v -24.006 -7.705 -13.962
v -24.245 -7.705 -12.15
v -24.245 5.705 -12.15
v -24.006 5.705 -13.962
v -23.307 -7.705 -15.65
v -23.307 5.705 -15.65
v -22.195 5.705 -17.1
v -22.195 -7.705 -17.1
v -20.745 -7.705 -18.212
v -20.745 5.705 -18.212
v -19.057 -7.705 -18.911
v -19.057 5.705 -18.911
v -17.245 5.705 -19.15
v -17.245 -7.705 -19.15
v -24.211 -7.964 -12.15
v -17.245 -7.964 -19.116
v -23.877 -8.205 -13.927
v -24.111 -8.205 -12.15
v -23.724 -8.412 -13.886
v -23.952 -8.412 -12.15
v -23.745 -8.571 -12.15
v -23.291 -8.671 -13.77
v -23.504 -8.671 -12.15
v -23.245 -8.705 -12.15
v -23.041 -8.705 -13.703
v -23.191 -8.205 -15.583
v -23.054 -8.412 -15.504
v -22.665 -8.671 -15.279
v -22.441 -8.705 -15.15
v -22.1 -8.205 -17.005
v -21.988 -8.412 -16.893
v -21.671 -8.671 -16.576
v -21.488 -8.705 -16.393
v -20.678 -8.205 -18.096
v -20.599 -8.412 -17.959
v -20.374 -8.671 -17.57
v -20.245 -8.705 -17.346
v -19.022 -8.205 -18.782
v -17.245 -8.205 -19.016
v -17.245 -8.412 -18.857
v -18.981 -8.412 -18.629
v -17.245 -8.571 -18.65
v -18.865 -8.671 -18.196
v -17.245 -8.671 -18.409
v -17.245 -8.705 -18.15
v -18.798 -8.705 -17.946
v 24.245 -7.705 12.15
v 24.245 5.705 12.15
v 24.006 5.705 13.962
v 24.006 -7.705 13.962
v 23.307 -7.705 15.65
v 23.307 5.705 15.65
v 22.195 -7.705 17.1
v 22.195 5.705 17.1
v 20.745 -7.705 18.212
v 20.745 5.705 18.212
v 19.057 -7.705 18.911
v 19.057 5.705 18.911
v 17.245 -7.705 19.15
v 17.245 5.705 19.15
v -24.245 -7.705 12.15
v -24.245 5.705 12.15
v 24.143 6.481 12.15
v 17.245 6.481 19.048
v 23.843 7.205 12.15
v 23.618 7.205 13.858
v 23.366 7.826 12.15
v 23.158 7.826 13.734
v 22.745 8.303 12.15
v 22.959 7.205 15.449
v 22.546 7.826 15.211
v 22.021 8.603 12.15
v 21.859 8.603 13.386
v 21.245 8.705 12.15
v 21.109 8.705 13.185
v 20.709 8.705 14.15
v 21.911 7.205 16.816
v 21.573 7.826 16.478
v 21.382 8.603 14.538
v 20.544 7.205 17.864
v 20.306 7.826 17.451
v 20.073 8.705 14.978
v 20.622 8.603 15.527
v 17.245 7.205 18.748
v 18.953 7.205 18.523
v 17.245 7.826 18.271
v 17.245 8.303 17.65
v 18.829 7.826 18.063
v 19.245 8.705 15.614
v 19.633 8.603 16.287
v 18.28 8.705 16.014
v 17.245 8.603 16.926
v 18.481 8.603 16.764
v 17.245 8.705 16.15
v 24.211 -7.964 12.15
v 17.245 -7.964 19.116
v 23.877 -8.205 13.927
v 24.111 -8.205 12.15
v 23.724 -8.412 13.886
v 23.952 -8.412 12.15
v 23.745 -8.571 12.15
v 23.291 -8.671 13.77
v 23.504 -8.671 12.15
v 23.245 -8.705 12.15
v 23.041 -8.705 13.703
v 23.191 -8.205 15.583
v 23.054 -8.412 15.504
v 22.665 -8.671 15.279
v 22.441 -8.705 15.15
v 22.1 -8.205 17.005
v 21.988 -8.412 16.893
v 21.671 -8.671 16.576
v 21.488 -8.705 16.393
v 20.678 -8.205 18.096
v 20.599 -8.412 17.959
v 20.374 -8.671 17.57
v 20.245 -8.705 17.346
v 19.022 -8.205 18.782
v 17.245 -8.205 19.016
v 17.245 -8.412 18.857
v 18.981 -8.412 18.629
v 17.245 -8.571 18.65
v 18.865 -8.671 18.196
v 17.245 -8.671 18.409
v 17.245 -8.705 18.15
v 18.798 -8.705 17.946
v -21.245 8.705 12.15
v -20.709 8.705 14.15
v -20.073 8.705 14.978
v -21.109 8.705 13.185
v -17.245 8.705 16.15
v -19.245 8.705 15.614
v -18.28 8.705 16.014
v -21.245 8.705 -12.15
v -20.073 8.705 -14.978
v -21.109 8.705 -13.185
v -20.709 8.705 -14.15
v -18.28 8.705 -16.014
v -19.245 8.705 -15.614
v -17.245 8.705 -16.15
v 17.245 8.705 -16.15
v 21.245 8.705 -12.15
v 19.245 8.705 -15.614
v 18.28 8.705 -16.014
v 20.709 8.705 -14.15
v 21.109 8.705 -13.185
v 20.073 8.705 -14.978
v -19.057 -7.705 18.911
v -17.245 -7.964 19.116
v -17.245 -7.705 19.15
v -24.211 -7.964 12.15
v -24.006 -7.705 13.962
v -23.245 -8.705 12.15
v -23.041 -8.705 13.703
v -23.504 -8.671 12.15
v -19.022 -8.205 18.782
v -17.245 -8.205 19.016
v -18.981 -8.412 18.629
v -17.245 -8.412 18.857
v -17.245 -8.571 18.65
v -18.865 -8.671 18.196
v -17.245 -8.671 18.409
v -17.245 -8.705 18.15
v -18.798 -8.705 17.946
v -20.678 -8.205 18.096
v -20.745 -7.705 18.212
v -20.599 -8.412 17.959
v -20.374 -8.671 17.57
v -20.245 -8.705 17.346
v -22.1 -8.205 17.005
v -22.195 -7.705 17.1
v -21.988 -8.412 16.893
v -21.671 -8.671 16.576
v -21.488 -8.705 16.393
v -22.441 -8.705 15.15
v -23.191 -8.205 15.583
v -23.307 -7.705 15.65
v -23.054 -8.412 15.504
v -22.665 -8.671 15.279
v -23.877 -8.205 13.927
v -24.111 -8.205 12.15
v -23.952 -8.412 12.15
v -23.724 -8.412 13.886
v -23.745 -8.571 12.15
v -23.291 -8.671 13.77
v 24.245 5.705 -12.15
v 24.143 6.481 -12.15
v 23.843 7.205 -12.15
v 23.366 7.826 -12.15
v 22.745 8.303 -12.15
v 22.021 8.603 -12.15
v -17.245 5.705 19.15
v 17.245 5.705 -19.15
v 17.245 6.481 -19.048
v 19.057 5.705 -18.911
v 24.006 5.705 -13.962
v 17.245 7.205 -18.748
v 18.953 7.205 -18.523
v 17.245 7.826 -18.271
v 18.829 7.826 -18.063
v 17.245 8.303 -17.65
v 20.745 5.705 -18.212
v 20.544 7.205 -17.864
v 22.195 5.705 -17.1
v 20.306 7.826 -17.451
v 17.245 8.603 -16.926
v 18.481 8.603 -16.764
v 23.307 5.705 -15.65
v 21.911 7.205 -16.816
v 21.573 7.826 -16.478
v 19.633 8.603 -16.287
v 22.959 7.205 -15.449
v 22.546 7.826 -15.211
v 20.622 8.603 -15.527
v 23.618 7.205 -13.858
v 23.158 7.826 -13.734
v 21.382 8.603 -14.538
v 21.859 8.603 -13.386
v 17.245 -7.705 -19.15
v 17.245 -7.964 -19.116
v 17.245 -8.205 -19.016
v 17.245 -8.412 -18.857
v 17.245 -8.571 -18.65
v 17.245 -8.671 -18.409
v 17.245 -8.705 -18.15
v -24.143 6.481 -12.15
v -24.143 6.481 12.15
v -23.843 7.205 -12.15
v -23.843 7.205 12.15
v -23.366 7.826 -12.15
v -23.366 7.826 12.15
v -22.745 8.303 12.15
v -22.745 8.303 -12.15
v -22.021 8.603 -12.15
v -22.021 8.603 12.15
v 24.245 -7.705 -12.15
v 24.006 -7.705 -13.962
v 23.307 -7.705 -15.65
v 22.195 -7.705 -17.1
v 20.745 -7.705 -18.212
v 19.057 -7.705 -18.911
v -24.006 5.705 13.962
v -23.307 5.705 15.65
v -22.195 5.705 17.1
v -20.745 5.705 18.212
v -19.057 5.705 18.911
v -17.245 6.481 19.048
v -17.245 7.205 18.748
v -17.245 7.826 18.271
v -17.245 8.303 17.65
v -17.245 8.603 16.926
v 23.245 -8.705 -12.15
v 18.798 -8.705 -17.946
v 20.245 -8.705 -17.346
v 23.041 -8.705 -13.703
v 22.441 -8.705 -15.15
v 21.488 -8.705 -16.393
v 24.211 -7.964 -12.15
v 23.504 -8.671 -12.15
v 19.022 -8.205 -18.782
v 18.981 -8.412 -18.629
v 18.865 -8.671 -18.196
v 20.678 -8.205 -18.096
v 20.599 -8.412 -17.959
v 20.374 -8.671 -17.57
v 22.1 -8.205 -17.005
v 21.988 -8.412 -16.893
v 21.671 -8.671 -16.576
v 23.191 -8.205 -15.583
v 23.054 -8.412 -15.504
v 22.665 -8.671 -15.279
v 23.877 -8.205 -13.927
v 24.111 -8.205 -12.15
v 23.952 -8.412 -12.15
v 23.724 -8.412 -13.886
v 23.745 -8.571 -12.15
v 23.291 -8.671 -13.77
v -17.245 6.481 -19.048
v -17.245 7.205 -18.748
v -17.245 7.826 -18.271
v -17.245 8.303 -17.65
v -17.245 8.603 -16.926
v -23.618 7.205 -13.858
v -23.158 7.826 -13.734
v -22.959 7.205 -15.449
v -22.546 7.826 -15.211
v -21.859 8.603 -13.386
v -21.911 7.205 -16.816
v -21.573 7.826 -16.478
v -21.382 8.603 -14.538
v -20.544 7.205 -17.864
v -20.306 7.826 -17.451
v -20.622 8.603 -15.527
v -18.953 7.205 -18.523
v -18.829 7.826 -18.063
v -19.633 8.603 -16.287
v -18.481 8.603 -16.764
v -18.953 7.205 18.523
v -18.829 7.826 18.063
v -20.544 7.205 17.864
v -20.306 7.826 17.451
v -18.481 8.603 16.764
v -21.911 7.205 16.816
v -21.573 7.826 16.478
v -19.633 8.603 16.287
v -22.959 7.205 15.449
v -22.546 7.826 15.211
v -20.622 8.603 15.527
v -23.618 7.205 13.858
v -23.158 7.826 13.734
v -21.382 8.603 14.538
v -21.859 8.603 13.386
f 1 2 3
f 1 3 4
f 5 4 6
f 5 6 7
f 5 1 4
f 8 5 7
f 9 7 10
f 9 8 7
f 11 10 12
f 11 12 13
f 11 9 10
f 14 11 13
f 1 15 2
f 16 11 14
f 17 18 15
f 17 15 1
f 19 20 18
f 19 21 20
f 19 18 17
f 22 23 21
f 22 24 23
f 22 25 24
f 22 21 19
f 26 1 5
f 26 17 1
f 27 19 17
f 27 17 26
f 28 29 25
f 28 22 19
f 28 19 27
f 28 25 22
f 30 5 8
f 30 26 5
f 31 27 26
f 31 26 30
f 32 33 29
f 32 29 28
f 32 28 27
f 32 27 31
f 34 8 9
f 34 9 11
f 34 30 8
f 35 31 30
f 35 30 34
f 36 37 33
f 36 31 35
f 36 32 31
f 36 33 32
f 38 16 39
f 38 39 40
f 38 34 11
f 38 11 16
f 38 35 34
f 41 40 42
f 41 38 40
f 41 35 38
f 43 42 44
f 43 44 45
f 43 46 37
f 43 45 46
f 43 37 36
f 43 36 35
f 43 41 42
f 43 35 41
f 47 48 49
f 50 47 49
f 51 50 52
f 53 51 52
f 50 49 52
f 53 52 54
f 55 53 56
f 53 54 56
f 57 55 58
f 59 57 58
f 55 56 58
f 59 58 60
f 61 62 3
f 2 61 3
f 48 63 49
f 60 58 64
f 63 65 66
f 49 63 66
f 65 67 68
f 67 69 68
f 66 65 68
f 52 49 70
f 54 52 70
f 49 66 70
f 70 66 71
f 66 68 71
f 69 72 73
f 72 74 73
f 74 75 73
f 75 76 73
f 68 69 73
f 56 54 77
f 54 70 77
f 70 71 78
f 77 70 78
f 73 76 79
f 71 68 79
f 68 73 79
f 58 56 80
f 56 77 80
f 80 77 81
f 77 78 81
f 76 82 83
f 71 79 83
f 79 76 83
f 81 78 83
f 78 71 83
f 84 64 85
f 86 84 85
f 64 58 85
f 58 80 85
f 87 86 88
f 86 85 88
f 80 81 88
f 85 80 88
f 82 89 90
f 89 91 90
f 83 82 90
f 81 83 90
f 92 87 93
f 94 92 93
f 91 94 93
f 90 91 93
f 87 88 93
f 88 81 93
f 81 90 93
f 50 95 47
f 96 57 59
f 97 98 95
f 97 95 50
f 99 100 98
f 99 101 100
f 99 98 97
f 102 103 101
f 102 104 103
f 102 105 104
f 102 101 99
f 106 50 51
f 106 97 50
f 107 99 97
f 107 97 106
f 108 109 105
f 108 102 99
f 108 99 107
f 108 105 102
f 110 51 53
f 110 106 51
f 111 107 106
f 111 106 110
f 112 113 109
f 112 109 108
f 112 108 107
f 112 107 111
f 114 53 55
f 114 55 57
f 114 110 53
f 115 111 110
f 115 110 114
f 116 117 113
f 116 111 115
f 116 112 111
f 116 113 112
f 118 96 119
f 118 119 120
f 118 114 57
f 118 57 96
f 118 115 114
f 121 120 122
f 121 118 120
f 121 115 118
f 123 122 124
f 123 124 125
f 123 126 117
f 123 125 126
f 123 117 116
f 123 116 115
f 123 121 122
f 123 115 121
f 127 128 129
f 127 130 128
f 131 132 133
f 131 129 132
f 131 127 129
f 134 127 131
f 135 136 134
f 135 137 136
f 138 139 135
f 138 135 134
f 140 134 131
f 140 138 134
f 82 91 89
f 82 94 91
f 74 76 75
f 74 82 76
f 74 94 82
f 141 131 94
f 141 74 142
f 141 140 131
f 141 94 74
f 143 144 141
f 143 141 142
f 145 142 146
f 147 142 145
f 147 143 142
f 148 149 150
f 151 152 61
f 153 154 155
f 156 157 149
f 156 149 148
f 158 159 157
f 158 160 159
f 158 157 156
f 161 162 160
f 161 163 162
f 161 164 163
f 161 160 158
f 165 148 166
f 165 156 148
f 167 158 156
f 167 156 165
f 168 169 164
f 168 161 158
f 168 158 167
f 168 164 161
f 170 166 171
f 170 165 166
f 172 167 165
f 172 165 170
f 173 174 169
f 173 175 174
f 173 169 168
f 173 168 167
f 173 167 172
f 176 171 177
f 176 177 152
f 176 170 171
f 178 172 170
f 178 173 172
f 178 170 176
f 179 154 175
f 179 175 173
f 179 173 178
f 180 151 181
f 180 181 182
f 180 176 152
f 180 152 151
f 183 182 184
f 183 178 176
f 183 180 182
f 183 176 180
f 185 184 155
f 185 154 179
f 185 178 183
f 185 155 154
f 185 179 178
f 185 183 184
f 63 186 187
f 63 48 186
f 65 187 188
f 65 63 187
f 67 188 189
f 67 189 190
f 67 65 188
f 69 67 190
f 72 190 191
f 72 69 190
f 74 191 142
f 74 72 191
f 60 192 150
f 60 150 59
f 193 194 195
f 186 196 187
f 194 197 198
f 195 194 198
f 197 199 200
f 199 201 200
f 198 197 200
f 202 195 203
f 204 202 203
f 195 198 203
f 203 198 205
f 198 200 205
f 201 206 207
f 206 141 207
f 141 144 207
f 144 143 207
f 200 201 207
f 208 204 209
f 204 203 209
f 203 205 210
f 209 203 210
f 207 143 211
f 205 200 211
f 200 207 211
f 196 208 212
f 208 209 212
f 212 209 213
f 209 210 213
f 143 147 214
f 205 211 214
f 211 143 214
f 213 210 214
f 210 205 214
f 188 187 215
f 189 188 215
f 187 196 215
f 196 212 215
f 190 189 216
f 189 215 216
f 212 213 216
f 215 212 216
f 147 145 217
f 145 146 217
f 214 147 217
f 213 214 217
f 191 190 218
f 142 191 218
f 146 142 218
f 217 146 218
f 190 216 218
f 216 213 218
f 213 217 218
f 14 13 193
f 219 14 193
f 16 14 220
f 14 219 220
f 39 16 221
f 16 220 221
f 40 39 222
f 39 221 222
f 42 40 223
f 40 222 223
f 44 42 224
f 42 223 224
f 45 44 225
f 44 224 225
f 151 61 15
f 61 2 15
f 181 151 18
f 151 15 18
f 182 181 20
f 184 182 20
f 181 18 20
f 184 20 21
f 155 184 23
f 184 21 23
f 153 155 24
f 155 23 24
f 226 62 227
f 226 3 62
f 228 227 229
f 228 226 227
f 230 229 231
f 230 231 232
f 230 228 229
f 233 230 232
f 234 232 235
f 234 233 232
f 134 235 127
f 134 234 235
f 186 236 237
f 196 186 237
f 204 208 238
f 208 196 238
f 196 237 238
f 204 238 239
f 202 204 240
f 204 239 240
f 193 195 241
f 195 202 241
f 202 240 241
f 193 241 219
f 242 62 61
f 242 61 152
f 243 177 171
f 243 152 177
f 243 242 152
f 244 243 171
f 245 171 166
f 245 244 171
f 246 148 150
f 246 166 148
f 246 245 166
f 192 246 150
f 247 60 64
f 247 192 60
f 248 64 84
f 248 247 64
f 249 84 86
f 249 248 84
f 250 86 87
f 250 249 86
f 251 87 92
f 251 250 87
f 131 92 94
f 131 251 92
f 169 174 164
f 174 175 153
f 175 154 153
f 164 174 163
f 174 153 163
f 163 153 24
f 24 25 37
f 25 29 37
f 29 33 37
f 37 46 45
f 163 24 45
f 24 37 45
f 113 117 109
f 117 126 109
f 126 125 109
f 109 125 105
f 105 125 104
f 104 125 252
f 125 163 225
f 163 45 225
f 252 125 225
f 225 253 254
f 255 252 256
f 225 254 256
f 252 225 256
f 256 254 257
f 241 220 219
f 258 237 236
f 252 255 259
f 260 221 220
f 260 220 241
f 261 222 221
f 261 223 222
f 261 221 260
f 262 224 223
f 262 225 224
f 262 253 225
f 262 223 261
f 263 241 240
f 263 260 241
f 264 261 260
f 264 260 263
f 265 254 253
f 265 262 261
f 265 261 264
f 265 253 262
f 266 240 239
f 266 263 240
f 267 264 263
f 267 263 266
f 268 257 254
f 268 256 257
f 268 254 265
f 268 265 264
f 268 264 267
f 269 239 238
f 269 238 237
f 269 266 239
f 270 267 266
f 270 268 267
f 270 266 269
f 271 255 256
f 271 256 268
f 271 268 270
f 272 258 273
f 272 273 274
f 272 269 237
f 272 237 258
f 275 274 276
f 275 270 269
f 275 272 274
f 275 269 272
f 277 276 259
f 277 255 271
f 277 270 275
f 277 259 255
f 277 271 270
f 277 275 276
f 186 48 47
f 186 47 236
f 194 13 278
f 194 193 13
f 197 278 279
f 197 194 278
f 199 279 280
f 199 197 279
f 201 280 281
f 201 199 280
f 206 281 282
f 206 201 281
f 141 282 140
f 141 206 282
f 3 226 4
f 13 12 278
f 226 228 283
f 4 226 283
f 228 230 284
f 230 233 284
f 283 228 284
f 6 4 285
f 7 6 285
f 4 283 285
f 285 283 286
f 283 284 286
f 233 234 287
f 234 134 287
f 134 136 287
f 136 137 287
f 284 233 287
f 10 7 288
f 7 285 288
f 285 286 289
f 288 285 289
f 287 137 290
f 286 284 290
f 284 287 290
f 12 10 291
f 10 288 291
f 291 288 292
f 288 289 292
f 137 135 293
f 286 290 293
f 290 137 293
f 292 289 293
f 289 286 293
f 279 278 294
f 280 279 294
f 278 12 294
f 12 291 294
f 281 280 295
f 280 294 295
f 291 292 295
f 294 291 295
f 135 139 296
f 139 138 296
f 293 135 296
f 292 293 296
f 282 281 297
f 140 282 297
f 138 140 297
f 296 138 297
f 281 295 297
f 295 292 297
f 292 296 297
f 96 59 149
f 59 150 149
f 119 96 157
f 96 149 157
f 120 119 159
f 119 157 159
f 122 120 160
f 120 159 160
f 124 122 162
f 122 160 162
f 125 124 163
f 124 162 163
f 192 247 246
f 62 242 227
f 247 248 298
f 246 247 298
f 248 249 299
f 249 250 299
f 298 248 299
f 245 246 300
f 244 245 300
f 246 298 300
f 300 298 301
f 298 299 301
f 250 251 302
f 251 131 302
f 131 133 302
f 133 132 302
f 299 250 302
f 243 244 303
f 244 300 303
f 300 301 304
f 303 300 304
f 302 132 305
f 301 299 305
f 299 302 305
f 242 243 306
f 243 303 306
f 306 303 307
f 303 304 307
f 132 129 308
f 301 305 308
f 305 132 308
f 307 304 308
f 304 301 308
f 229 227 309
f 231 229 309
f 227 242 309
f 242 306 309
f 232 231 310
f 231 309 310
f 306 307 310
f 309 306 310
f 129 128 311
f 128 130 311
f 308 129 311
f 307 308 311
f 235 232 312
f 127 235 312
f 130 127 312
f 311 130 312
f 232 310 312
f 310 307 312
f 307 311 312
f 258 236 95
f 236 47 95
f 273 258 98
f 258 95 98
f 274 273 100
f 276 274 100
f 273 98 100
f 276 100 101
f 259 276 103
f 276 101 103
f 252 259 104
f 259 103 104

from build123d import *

# Parameters (mm, degrees)
SKETCH1_W           = 48.49
SKETCH1_H           = 38.3
BOSS_EXTRUDE1_DEPTH = 8.705
FILLET1_R           = 7
FILLET2_R           = 3
FILLET3_R           = 1


with BuildPart() as part:
    # Sketch1 → Boss-Extrude1 (new, symmetric)
    with BuildSketch(Plane(origin=(0, 0, 0), x_dir=(1, 0, 0), z_dir=(0, 1, 0))):
        Rectangle(SKETCH1_W, SKETCH1_H)
    extrude(amount=BOSS_EXTRUDE1_DEPTH, both=True)

    # Fillet1
    fillet1_edges = [part.edges().sort_by_distance(p)[0] for p in [
        (24.245, 0, 19.15),
        (-24.245, 0, 19.15),
        (-24.245, 0, -19.15),
        (24.245, 0, -19.15),
    ]]
    fillet(fillet1_edges, radius=FILLET1_R)

    # Fillet2
    fillet2_edges = [part.edges().sort_by_distance(p)[0] for p in [
        (-24.245, 8.705, 0),
        (0, 8.705, -19.15),
        (24.245, 8.705, 0),
        (0, 8.705, 19.15),
        (-22.194747468, 8.705, 17.099747468),
        (22.194747468, 8.705, 17.099747468),
        (22.194747468, 8.705, -17.099747468),
        (-22.194747468, 8.705, -17.099747468),
    ]]
    fillet(fillet2_edges, radius=FILLET2_R)

    # Fillet3
    fillet3_edges = [part.edges().sort_by_distance(p)[0] for p in [
        (-24.245, -8.705, 0),
        (24.245, -8.705, 0),
        (0, -8.705, 19.15),
        (0, -8.705, -19.15),
        (-22.194747468, -8.705, 17.099747468),
        (22.194747468, -8.705, 17.099747468),
        (22.194747468, -8.705, -17.099747468),
        (-22.194747468, -8.705, -17.099747468),
    ]]
    fillet(fillet3_edges, radius=FILLET3_R)


solid = part.part
